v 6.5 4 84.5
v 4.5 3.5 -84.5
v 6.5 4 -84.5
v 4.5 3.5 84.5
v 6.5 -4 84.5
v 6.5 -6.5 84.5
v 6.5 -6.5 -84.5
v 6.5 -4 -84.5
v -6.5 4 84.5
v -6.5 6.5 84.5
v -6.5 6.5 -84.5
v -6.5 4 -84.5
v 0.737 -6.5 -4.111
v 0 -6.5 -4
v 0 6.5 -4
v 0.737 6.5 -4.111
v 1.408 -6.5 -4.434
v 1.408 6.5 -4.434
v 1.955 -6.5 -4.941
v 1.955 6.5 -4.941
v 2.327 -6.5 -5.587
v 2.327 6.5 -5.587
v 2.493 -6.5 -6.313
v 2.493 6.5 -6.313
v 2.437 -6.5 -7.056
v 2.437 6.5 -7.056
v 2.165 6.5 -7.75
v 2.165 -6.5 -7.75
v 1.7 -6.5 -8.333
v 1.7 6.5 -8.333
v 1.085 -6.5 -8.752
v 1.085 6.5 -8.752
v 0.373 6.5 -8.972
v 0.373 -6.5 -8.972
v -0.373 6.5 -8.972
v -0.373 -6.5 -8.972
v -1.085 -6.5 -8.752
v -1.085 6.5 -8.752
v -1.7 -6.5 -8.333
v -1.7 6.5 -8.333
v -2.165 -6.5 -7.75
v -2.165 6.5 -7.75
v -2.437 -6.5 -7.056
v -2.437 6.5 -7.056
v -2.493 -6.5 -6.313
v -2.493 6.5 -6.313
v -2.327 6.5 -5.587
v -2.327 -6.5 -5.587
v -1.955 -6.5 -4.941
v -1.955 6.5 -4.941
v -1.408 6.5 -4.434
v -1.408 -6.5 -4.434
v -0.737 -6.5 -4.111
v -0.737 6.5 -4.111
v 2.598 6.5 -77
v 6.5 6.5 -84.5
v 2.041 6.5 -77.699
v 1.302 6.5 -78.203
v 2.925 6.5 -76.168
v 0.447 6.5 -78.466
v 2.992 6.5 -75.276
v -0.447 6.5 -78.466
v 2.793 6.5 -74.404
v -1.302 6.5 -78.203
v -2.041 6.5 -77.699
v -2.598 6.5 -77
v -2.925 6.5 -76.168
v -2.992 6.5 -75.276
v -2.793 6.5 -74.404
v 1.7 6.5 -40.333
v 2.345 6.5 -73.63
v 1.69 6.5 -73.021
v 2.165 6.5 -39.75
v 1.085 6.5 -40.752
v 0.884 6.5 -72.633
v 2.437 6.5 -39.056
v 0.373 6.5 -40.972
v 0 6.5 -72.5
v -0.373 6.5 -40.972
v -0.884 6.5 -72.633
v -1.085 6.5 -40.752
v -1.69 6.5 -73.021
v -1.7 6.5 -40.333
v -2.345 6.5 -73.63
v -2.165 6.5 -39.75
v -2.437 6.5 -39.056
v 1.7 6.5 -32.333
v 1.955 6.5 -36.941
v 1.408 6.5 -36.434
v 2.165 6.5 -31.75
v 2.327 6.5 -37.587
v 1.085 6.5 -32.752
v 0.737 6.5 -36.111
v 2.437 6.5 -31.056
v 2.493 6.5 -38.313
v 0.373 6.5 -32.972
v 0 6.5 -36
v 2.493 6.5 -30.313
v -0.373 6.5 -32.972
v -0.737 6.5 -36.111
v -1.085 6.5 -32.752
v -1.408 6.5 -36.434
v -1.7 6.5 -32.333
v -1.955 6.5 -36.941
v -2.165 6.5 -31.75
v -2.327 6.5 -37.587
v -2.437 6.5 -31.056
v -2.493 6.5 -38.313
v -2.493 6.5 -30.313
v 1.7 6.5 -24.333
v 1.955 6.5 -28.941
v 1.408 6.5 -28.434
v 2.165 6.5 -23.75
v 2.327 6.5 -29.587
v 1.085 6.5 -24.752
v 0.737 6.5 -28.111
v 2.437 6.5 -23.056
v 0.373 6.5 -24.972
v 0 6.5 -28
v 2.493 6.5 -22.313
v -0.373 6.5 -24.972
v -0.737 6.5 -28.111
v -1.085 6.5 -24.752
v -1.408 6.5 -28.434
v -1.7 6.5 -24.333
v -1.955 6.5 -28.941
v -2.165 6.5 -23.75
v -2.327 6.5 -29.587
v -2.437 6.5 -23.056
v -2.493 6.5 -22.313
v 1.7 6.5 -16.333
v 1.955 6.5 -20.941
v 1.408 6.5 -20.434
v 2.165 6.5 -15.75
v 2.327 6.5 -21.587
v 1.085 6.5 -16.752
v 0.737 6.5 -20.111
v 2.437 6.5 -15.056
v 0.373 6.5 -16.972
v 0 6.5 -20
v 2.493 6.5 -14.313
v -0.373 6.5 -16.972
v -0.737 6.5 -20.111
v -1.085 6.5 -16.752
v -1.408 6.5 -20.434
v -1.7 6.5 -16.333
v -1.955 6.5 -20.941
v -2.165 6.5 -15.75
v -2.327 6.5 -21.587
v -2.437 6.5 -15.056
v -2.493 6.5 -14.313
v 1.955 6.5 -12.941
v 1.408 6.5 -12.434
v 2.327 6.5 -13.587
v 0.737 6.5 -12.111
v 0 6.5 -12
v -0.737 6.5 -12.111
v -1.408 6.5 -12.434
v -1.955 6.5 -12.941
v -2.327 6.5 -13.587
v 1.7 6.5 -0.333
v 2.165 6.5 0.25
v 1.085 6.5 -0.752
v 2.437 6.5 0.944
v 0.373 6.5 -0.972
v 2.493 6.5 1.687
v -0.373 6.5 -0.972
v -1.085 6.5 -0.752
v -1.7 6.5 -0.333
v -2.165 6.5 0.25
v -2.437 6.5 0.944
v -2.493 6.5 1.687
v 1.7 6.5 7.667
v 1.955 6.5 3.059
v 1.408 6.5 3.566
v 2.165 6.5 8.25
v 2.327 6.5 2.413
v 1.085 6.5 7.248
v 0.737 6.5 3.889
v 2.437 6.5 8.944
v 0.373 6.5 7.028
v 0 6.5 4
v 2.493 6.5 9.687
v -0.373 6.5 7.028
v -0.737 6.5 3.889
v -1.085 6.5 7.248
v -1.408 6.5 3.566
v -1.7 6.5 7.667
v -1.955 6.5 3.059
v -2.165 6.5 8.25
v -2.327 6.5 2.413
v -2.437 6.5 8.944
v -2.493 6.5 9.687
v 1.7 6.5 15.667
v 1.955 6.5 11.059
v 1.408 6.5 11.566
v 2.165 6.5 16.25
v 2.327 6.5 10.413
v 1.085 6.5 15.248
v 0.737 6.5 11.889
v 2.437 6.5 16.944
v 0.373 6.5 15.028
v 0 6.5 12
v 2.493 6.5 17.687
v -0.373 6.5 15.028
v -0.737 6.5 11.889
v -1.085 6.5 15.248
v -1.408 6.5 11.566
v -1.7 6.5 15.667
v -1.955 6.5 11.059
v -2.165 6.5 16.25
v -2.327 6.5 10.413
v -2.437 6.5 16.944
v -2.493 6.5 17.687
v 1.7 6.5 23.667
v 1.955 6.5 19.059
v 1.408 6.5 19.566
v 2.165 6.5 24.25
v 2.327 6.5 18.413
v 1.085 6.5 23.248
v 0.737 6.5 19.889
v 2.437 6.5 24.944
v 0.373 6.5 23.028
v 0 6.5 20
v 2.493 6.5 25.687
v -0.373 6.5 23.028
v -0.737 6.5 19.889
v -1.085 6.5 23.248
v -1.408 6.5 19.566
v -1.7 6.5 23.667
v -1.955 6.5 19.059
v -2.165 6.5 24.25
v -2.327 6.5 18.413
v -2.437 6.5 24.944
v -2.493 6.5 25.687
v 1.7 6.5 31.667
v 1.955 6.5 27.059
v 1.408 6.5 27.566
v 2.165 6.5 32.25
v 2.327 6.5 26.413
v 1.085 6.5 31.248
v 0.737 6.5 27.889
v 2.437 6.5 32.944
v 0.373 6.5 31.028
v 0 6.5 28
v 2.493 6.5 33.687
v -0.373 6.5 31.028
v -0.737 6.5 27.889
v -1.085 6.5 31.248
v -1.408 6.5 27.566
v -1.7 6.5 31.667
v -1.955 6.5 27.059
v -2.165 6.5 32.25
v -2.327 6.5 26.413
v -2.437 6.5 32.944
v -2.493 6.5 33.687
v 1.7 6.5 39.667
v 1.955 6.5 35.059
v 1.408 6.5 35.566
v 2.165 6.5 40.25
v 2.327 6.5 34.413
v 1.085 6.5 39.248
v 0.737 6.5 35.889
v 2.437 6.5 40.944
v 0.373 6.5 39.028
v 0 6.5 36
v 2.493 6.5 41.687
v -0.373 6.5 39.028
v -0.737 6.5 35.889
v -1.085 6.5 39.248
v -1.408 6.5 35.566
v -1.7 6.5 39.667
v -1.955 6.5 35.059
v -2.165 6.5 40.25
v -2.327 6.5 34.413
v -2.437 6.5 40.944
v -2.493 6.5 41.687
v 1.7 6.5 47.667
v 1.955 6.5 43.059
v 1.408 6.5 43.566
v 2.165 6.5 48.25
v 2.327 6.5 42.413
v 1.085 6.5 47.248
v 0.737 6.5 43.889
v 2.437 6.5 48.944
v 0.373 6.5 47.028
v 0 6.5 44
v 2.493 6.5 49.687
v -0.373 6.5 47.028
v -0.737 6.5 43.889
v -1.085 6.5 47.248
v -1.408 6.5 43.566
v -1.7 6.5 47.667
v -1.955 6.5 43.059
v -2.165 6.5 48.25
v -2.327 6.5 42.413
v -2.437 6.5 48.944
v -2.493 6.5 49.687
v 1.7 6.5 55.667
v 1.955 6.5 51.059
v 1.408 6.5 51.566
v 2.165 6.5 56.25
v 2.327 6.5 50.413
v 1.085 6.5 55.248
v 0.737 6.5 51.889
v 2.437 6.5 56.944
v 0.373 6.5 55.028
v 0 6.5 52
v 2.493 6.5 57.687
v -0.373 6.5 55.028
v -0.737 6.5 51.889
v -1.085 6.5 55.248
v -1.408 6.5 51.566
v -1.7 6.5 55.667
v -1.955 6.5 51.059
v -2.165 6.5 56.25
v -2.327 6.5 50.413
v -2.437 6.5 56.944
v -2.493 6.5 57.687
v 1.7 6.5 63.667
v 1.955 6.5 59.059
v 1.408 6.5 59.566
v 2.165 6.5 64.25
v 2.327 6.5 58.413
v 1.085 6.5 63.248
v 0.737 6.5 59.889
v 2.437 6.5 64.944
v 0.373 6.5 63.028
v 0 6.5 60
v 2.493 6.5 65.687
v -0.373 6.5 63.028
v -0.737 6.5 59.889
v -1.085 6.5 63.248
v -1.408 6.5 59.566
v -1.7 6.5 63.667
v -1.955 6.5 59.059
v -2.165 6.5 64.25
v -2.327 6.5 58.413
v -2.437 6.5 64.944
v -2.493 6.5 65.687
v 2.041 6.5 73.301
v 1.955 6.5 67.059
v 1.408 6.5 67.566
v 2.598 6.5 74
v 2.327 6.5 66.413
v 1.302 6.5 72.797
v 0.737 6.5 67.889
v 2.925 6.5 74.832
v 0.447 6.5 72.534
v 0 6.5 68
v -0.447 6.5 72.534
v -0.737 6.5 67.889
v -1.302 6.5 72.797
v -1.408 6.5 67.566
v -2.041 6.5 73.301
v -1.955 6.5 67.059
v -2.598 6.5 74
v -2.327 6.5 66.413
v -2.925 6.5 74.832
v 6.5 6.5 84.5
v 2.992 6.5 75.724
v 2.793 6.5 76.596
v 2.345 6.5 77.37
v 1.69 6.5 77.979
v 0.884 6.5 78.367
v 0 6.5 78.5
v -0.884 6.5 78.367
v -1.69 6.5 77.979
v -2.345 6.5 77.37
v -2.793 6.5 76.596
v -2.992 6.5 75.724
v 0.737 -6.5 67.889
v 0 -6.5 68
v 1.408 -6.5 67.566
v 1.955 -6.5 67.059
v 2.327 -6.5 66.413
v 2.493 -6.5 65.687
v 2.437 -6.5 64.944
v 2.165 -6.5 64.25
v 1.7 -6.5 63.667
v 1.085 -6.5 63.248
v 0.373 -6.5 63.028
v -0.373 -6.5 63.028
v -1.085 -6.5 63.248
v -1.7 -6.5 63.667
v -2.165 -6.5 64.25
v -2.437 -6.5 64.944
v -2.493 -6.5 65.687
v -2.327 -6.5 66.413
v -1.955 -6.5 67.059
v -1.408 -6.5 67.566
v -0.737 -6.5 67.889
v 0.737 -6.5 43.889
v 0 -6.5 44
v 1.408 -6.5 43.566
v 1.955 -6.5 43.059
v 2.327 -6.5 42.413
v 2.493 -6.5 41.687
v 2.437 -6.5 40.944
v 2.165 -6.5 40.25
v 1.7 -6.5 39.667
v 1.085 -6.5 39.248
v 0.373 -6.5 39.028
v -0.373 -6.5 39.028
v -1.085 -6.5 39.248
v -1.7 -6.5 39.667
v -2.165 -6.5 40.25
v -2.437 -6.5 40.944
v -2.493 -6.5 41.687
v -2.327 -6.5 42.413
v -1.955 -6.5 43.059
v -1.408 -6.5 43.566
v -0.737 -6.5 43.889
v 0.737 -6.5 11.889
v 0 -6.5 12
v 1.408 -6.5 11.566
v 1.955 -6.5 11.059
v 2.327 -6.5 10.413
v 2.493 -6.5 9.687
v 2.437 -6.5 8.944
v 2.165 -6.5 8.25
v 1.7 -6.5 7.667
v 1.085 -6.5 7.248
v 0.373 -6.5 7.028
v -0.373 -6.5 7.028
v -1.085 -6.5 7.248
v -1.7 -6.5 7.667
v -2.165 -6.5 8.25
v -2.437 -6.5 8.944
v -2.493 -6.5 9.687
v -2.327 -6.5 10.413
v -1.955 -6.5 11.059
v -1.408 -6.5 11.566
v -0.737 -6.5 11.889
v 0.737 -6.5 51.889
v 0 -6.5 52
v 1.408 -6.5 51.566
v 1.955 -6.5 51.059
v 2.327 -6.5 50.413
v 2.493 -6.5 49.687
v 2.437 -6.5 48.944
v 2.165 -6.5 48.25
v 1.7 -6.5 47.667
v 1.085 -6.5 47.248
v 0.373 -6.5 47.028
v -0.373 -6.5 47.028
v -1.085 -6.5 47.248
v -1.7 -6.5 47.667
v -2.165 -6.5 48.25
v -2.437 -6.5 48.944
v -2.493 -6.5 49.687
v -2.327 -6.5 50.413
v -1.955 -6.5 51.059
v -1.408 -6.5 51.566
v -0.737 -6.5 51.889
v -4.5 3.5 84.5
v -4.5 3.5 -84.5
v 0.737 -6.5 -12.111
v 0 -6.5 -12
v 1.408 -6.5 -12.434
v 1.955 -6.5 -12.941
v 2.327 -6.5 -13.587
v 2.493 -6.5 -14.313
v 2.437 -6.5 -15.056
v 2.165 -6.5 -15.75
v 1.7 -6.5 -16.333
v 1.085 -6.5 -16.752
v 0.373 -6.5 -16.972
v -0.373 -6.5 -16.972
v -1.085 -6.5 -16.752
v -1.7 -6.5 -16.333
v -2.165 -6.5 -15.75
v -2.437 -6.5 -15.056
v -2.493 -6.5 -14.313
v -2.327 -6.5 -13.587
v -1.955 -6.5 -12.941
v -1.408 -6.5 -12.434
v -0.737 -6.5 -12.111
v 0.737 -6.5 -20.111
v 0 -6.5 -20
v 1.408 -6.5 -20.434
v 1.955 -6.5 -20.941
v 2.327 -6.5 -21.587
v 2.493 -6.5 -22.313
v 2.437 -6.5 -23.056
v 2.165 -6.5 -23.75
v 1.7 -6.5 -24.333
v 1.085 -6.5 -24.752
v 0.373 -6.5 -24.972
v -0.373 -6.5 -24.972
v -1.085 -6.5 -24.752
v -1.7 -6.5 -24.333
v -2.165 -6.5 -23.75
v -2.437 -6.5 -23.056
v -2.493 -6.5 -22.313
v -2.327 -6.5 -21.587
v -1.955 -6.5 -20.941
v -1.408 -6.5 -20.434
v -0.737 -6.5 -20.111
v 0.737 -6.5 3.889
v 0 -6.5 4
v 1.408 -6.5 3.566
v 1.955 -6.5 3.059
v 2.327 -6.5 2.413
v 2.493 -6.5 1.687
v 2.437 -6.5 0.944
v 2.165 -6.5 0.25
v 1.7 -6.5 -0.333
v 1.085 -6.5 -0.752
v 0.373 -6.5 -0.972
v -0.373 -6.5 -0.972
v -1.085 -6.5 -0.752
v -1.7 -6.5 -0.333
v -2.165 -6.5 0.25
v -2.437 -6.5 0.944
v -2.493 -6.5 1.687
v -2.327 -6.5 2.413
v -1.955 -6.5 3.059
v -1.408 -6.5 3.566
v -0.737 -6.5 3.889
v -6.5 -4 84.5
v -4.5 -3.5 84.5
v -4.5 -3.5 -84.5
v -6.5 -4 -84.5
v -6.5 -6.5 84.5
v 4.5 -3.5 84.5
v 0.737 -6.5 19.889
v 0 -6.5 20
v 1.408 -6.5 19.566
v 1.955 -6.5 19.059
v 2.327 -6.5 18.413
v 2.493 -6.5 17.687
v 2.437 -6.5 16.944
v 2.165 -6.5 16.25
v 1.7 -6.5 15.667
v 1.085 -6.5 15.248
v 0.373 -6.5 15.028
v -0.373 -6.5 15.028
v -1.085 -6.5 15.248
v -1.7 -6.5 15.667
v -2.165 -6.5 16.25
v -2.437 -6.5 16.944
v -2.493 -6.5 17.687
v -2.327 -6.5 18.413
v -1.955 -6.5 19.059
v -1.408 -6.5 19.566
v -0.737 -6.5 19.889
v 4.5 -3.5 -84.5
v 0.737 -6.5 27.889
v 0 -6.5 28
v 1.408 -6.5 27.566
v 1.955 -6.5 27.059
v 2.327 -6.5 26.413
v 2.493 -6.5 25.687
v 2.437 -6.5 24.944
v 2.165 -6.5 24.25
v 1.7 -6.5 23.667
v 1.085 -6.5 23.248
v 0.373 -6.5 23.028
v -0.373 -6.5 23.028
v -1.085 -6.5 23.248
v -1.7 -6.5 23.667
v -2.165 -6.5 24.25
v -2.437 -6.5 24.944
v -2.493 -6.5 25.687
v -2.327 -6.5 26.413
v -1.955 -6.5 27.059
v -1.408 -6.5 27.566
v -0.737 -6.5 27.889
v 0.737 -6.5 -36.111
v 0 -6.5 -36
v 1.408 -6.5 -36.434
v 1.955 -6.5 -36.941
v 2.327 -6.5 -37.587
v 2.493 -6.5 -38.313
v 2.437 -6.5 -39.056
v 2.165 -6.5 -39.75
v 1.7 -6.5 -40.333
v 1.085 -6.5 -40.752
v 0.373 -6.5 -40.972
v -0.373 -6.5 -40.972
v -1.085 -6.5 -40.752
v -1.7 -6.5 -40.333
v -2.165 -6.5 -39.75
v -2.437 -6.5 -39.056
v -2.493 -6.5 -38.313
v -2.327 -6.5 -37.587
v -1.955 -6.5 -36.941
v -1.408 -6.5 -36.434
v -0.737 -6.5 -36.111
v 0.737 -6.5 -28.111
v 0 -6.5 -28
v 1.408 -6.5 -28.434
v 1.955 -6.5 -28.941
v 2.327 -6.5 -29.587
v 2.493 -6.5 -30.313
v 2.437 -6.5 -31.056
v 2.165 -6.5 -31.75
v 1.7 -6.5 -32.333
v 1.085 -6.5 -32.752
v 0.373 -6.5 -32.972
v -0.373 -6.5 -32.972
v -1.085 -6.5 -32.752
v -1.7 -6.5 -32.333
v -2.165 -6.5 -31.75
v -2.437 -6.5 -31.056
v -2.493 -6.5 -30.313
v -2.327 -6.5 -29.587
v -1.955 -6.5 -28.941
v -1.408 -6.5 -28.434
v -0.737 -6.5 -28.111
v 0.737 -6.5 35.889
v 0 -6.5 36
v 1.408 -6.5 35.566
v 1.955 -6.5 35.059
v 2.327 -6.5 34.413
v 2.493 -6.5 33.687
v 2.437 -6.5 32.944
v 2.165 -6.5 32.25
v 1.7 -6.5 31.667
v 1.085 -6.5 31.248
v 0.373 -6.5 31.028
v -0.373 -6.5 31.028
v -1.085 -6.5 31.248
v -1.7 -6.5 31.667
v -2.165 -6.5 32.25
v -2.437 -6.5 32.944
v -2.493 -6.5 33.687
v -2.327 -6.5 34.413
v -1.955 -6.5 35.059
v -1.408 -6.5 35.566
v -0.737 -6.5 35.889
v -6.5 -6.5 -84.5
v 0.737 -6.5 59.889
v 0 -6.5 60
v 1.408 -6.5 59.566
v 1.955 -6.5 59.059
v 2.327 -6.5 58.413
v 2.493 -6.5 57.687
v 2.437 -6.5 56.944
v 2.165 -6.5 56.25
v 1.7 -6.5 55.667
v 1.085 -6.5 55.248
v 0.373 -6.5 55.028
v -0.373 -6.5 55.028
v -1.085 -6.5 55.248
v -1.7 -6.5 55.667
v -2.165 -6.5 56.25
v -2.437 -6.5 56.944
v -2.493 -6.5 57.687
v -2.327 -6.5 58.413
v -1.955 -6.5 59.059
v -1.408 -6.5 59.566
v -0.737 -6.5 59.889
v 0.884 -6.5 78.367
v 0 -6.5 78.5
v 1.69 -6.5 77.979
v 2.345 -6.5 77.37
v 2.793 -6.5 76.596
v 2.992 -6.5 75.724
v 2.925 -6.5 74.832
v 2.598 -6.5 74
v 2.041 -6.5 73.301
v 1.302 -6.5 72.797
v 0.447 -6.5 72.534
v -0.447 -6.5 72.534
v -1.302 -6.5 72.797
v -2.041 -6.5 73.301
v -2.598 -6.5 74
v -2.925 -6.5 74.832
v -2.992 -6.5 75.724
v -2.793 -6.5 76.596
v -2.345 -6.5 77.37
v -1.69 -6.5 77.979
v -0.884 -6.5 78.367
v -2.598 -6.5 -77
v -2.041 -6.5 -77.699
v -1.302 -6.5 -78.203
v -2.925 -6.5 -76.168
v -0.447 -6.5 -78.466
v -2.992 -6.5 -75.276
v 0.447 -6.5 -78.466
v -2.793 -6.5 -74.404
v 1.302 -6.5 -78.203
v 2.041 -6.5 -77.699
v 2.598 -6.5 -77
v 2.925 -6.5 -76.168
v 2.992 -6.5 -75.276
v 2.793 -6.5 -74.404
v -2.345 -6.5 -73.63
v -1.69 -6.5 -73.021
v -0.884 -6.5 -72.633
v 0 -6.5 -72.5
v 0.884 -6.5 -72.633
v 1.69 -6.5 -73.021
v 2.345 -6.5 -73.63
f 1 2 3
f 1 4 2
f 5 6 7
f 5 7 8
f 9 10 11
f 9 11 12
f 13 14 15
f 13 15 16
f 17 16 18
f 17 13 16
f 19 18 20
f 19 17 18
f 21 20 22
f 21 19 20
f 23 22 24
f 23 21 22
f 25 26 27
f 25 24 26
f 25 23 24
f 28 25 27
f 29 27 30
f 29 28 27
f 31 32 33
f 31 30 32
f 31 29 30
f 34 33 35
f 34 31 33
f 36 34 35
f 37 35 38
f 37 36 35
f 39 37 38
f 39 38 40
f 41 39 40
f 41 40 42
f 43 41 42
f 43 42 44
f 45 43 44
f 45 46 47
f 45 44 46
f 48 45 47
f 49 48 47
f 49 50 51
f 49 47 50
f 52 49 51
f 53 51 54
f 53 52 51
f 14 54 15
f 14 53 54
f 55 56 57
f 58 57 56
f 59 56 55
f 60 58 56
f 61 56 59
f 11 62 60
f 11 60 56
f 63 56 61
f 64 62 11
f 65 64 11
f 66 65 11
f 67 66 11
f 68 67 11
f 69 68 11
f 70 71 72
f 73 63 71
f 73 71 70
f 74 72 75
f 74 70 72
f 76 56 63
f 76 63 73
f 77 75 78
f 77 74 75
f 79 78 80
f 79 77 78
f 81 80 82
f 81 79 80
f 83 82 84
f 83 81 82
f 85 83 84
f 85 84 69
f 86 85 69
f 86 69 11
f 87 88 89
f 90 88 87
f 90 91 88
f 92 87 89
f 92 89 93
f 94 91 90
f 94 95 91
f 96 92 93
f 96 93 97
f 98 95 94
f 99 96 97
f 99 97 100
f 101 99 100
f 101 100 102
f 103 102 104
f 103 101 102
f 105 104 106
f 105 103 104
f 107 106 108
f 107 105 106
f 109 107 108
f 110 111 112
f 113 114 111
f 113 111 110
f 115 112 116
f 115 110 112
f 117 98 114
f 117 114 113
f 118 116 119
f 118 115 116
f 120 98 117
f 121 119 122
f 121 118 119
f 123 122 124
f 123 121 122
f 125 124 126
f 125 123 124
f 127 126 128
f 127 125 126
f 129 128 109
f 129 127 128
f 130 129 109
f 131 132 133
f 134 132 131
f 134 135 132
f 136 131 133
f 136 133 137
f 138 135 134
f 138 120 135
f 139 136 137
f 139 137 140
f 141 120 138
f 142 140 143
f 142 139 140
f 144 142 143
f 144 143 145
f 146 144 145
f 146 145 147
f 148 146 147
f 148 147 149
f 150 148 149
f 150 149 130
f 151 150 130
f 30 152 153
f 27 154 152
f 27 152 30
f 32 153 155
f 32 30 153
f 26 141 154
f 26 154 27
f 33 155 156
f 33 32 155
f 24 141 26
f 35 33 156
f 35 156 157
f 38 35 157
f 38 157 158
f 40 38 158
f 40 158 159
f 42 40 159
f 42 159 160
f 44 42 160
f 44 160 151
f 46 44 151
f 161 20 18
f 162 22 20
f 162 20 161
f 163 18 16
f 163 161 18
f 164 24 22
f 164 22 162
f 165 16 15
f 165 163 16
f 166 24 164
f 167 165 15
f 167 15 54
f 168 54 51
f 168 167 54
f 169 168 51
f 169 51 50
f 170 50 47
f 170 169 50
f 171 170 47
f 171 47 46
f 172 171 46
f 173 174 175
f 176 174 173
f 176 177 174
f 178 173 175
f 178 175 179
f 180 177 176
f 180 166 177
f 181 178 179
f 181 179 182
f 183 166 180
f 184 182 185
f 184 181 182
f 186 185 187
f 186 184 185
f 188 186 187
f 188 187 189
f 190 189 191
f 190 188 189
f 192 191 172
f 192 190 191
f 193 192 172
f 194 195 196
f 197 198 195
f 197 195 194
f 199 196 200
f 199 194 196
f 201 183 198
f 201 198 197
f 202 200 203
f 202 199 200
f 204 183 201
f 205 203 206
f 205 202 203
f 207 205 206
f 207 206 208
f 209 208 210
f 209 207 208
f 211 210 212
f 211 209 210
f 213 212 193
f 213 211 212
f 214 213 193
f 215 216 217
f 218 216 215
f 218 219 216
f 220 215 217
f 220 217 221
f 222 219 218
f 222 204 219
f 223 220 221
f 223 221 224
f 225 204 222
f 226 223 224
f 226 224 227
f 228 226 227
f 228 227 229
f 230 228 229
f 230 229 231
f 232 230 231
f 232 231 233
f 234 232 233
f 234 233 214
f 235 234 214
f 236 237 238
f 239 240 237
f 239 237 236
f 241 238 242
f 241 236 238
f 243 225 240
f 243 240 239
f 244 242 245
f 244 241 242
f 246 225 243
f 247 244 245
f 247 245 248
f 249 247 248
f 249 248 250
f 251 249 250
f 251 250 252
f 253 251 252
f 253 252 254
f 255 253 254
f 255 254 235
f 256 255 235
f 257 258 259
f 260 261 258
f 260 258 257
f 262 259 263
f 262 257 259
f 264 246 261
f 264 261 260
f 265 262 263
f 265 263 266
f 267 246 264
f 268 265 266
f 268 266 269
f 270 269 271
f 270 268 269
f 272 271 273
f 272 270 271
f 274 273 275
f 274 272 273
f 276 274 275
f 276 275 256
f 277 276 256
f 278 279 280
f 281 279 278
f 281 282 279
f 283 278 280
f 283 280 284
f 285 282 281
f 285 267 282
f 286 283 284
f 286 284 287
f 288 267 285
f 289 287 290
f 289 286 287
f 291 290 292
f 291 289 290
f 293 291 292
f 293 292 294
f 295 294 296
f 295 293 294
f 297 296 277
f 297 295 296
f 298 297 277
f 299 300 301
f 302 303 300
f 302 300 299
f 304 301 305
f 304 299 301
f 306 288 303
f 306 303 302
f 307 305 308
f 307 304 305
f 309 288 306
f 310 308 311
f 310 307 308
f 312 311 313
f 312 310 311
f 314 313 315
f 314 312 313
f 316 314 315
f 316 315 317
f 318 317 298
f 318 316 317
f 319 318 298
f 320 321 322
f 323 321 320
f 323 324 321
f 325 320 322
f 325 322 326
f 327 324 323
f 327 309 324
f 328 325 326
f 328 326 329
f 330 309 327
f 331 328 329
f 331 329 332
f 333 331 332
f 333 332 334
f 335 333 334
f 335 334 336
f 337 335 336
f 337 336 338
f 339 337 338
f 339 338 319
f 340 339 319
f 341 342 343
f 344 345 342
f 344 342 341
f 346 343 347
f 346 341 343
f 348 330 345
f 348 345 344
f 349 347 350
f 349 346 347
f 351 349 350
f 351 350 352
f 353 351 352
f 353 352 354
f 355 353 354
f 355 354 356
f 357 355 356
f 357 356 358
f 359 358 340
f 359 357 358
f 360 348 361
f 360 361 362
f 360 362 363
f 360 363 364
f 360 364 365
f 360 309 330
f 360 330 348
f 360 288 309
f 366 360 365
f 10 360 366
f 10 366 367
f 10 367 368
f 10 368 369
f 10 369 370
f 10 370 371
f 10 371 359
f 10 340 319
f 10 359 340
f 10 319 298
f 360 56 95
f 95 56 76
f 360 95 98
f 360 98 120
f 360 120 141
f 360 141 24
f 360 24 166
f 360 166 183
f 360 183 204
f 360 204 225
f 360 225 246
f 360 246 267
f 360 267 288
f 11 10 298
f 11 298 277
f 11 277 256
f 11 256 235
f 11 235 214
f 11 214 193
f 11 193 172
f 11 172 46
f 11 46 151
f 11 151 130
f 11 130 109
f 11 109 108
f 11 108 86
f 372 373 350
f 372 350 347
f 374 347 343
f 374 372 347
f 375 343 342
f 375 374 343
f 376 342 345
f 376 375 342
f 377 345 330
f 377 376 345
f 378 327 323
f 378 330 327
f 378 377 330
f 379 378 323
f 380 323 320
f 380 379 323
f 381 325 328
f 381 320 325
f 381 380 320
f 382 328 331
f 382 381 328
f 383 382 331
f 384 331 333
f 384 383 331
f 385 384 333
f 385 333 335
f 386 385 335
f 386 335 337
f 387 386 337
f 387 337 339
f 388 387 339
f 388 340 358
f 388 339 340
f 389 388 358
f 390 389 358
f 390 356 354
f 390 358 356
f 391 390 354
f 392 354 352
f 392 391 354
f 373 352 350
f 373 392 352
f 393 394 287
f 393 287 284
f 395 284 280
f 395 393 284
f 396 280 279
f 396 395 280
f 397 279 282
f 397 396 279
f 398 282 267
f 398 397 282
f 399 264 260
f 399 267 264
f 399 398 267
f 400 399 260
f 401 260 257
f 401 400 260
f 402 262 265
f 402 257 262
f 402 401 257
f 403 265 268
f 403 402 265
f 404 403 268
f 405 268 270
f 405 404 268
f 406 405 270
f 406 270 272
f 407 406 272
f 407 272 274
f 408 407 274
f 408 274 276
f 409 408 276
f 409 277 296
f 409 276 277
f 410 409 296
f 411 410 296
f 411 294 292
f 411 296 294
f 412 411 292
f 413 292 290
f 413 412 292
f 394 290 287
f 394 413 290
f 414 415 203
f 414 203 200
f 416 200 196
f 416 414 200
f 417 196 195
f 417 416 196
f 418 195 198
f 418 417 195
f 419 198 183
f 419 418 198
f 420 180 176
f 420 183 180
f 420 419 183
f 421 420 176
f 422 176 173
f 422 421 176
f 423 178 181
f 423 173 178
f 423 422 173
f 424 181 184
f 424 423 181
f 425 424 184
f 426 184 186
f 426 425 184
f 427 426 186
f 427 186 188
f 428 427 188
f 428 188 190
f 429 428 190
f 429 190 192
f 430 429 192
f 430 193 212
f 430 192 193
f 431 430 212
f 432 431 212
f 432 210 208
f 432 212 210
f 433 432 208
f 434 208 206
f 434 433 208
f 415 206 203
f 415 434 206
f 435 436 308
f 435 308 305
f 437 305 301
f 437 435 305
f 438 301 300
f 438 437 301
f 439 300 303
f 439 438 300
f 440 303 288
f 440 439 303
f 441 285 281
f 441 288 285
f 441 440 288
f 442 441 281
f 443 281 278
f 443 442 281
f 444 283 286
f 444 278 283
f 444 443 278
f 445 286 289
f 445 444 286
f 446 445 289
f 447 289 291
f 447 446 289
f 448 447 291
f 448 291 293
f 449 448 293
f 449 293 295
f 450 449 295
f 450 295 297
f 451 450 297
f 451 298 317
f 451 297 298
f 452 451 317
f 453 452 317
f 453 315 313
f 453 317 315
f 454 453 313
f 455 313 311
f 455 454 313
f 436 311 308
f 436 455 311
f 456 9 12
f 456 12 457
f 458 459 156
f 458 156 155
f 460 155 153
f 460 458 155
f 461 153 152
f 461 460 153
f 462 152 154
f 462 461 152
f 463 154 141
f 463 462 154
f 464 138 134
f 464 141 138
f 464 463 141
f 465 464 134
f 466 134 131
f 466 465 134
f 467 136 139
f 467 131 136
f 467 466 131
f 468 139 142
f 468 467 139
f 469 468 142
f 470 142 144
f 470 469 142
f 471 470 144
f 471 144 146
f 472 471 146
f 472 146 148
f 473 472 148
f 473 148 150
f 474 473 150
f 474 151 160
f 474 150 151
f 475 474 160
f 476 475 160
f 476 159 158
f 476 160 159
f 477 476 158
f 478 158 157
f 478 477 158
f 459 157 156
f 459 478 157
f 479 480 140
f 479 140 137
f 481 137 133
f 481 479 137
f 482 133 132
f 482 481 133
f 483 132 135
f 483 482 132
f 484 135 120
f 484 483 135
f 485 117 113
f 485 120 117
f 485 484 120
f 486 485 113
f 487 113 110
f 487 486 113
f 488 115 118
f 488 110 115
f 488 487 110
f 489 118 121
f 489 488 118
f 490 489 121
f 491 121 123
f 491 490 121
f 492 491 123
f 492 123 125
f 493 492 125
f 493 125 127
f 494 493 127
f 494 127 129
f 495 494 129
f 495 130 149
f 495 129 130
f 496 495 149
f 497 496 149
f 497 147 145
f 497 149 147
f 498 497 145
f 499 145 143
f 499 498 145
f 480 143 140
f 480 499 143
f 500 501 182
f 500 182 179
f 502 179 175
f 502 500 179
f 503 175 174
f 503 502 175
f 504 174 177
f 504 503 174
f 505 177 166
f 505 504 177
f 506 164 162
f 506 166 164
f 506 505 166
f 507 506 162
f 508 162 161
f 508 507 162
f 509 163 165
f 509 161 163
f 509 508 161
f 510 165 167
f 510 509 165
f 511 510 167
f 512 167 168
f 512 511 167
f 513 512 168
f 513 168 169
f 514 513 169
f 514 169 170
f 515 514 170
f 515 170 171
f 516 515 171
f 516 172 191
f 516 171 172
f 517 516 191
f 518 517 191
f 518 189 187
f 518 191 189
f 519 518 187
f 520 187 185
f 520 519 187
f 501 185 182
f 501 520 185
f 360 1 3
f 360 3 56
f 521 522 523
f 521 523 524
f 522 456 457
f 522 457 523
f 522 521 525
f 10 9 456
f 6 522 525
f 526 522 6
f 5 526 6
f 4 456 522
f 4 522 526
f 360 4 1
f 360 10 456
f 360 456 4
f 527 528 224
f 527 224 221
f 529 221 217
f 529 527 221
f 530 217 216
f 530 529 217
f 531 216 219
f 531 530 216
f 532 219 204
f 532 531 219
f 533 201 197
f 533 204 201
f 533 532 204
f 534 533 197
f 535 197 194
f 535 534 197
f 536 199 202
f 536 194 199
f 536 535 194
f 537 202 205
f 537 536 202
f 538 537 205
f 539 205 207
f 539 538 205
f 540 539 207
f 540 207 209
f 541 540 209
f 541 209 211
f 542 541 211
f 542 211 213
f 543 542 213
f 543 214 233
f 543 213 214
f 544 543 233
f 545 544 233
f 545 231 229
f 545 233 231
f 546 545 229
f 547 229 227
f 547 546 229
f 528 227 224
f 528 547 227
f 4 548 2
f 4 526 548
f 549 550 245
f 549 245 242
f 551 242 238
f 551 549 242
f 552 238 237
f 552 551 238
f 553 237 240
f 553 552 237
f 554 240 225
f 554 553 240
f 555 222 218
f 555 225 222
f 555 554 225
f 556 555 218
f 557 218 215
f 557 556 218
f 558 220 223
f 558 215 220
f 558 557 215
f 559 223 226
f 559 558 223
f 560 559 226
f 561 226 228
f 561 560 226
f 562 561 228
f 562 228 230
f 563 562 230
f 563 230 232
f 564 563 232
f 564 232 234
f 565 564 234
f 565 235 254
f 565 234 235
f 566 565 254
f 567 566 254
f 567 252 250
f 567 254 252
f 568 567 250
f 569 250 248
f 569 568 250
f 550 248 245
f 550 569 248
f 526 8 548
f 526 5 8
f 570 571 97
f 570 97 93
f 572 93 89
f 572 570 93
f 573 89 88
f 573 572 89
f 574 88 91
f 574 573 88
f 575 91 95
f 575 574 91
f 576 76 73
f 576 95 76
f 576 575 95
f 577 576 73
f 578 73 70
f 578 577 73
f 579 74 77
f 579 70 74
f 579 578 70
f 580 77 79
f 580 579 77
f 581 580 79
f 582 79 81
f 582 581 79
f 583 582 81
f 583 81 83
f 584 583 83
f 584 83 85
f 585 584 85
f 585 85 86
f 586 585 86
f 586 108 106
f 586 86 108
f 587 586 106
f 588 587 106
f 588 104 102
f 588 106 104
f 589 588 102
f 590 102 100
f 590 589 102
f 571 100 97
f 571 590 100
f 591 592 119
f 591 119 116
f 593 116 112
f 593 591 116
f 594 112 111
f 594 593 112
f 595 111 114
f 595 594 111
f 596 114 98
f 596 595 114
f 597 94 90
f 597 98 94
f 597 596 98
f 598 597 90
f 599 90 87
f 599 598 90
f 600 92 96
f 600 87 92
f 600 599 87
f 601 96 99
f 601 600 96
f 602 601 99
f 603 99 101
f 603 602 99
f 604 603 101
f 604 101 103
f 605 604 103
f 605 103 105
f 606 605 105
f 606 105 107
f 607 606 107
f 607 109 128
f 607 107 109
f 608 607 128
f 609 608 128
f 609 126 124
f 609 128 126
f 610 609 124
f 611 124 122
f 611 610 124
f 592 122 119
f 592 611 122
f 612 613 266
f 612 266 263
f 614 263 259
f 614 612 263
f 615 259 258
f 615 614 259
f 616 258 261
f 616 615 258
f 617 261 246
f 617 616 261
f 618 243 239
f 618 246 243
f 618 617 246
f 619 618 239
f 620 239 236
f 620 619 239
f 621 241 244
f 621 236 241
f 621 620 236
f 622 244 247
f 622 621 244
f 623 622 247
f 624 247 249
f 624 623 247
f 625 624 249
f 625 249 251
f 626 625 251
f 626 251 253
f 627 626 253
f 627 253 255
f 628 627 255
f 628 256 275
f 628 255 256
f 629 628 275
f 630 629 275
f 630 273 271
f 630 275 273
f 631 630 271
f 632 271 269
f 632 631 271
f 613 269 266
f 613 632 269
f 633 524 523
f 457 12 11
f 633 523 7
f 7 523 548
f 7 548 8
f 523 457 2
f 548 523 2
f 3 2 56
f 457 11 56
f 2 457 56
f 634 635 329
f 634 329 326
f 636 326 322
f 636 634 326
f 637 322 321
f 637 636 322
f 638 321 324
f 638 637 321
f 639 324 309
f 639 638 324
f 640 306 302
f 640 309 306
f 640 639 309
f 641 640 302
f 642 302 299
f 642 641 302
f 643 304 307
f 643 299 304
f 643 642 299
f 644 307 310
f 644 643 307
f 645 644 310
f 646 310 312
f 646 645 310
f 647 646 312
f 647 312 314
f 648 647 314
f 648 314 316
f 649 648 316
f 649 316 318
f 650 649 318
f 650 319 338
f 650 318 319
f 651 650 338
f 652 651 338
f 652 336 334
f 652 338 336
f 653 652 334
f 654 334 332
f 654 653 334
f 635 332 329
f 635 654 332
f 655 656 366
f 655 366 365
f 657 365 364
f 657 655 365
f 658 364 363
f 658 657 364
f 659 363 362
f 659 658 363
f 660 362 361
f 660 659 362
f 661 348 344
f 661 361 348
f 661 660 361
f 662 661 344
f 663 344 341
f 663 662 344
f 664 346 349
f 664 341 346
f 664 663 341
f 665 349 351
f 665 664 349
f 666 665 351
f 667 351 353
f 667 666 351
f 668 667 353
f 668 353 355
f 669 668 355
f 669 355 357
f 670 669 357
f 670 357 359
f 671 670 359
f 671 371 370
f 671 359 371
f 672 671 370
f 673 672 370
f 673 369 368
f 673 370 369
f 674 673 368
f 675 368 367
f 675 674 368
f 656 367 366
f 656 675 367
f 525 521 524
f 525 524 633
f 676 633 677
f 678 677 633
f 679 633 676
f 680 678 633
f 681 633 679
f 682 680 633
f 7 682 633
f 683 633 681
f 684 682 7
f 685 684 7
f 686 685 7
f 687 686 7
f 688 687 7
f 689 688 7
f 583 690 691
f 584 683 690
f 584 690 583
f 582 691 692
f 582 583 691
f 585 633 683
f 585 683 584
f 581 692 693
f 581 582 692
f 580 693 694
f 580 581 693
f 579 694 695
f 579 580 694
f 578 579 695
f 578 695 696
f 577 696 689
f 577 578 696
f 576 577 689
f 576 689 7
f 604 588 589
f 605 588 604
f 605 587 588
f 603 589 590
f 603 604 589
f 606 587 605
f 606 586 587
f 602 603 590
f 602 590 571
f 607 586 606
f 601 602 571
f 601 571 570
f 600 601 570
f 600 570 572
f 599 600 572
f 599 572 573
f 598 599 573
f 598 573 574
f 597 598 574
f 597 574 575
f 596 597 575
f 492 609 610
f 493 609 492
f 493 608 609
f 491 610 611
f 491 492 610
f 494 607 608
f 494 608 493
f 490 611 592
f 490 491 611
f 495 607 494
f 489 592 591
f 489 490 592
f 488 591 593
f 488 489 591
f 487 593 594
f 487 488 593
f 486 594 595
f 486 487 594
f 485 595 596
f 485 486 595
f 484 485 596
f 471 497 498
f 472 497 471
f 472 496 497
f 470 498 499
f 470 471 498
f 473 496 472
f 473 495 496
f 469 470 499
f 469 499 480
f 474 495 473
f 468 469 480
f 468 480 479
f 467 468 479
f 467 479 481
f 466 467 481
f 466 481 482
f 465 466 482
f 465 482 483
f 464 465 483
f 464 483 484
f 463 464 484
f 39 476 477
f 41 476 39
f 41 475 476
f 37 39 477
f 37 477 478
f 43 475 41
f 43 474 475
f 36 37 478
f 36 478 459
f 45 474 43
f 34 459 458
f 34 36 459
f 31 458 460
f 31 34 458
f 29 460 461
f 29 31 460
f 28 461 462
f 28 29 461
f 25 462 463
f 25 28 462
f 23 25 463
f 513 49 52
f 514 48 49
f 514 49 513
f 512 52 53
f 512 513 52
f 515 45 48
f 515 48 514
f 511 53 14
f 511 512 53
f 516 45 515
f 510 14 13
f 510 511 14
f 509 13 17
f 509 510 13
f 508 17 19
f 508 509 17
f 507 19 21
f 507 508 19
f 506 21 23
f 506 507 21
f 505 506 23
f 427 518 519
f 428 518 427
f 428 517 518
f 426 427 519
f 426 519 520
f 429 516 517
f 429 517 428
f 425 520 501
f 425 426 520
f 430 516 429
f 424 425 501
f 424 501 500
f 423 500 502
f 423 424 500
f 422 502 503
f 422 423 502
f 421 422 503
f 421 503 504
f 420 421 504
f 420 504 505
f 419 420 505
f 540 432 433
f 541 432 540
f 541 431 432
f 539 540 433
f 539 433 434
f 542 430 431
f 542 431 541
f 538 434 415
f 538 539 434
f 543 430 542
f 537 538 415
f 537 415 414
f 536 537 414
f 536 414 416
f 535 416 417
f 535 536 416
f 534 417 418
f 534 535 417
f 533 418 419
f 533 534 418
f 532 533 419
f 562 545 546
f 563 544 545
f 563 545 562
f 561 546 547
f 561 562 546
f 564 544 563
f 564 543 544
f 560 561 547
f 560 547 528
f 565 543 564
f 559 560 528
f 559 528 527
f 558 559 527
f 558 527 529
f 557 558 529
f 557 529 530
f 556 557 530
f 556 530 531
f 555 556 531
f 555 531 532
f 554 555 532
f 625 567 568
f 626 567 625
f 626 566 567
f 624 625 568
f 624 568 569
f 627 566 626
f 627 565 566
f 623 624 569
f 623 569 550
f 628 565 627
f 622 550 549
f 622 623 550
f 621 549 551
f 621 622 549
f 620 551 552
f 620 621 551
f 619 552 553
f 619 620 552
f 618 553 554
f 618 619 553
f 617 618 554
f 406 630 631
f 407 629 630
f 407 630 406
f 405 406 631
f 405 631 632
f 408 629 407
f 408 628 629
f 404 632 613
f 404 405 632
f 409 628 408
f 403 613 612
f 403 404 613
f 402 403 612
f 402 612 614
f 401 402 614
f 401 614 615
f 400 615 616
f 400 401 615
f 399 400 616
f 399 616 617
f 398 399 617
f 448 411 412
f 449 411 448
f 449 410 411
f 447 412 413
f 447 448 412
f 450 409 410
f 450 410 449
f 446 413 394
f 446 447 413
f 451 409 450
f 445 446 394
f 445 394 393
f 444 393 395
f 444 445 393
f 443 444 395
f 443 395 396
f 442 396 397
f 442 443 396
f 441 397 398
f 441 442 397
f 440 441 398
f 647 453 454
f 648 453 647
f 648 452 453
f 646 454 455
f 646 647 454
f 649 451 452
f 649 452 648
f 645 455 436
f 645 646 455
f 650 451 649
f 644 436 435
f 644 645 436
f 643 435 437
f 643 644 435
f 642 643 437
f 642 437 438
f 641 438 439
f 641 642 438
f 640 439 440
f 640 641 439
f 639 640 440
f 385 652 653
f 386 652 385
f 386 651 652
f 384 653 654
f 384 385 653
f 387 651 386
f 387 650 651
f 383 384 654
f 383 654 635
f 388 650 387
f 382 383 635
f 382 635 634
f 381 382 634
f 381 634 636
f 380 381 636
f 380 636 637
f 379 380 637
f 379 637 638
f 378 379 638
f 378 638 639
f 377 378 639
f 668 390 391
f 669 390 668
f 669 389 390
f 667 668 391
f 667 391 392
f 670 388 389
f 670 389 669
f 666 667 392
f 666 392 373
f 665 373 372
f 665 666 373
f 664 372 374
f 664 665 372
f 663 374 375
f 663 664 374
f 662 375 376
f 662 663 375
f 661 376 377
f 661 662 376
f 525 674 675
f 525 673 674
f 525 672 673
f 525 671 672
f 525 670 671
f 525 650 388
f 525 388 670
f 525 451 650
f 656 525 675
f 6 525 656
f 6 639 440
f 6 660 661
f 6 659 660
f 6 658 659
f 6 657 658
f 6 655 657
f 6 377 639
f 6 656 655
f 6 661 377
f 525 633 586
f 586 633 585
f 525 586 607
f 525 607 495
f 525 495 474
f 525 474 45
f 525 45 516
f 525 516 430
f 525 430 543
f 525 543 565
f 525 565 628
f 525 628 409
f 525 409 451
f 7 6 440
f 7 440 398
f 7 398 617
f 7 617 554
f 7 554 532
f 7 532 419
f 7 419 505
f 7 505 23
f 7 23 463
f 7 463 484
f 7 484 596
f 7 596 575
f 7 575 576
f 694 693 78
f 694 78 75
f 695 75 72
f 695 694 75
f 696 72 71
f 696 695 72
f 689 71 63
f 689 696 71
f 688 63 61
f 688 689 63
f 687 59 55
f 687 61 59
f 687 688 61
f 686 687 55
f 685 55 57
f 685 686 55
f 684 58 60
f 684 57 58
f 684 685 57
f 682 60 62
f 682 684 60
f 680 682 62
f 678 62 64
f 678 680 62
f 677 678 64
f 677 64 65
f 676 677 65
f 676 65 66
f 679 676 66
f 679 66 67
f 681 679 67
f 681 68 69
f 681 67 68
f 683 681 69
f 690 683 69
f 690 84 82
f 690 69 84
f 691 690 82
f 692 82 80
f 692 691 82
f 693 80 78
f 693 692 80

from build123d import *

# Parameters (mm, degrees)
BOSS_EXTRUDE1_DEPTH     = 84.5
CUT_EXTRUDE1_DEPTH      = 85.998529399
CUT_EXTRUDE1_DEPTH_BACK = 85.998529399
SKETCH2_R               = 3
SKETCH2_R_2             = 2.5


with BuildPart() as part:
    # Sketch1 → Boss-Extrude1 (new, symmetric)
    with BuildSketch(Plane.XY):
        Polygon((4.5, 3.5), (6.5, 4), (6.5, 6.5), (-6.5, 6.5), (-6.5, 4), (-4.5, 3.5), (-4.5, -3.5), (-6.5, -4), (-6.5, -6.5), (6.5, -6.5), (6.5, -4), (4.5, -3.5), align=None)
    extrude(amount=BOSS_EXTRUDE1_DEPTH, both=True)

    # Sketch2 → Cut-Extrude1 (cut, two sides: drawn at the far end of the back side and taken through both)
    with BuildSketch(Plane(origin=(0, 0, 0), x_dir=(1, 0, 0), z_dir=(0, 1, 0)).offset(-CUT_EXTRUDE1_DEPTH_BACK)):
        with Locations(Location((0, 75.5, 0), (0, 0, 270))):
            Circle(SKETCH2_R)
        with Locations(Location((0, -75.5, 0), (0, 0, 270))):
            Circle(SKETCH2_R)
        with Locations(Location((0, -65.5, 0), (0, 0, 270))):
            Circle(SKETCH2_R_2)
        with Locations(Location((0, -57.5, 0), (0, 0, 270))):
            Circle(SKETCH2_R_2)
        with Locations(Location((0, -49.5, 0), (0, 0, 270))):
            Circle(SKETCH2_R_2)
        with Locations(Location((0, -41.5, 0), (0, 0, 270))):
            Circle(SKETCH2_R_2)
        with Locations(Location((0, -33.5, 0), (0, 0, 270))):
            Circle(SKETCH2_R_2)
        with Locations(Location((0, -25.5, 0), (0, 0, 270))):
            Circle(SKETCH2_R_2)
        with Locations(Location((0, -17.5, 0), (0, 0, 270))):
            Circle(SKETCH2_R_2)
        with Locations(Location((0, -9.5, 0), (0, 0, 270))):
            Circle(SKETCH2_R_2)
        with Locations(Location((0, -1.5, 0), (0, 0, 270))):
            Circle(SKETCH2_R_2)
        with Locations(Location((0, 6.5, 0), (0, 0, 270))):
            Circle(SKETCH2_R_2)
        with Locations(Location((0, 14.5, 0), (0, 0, 270))):
            Circle(SKETCH2_R_2)
        with Locations(Location((0, 22.5, 0), (0, 0, 270))):
            Circle(SKETCH2_R_2)
        with Locations(Location((0, 30.5, 0), (0, 0, 270))):
            Circle(SKETCH2_R_2)
        with Locations(Location((0, 38.5, 0), (0, 0, 270))):
            Circle(SKETCH2_R_2)
    extrude(amount=CUT_EXTRUDE1_DEPTH + CUT_EXTRUDE1_DEPTH_BACK, mode=Mode.SUBTRACT)


solid = part.part
